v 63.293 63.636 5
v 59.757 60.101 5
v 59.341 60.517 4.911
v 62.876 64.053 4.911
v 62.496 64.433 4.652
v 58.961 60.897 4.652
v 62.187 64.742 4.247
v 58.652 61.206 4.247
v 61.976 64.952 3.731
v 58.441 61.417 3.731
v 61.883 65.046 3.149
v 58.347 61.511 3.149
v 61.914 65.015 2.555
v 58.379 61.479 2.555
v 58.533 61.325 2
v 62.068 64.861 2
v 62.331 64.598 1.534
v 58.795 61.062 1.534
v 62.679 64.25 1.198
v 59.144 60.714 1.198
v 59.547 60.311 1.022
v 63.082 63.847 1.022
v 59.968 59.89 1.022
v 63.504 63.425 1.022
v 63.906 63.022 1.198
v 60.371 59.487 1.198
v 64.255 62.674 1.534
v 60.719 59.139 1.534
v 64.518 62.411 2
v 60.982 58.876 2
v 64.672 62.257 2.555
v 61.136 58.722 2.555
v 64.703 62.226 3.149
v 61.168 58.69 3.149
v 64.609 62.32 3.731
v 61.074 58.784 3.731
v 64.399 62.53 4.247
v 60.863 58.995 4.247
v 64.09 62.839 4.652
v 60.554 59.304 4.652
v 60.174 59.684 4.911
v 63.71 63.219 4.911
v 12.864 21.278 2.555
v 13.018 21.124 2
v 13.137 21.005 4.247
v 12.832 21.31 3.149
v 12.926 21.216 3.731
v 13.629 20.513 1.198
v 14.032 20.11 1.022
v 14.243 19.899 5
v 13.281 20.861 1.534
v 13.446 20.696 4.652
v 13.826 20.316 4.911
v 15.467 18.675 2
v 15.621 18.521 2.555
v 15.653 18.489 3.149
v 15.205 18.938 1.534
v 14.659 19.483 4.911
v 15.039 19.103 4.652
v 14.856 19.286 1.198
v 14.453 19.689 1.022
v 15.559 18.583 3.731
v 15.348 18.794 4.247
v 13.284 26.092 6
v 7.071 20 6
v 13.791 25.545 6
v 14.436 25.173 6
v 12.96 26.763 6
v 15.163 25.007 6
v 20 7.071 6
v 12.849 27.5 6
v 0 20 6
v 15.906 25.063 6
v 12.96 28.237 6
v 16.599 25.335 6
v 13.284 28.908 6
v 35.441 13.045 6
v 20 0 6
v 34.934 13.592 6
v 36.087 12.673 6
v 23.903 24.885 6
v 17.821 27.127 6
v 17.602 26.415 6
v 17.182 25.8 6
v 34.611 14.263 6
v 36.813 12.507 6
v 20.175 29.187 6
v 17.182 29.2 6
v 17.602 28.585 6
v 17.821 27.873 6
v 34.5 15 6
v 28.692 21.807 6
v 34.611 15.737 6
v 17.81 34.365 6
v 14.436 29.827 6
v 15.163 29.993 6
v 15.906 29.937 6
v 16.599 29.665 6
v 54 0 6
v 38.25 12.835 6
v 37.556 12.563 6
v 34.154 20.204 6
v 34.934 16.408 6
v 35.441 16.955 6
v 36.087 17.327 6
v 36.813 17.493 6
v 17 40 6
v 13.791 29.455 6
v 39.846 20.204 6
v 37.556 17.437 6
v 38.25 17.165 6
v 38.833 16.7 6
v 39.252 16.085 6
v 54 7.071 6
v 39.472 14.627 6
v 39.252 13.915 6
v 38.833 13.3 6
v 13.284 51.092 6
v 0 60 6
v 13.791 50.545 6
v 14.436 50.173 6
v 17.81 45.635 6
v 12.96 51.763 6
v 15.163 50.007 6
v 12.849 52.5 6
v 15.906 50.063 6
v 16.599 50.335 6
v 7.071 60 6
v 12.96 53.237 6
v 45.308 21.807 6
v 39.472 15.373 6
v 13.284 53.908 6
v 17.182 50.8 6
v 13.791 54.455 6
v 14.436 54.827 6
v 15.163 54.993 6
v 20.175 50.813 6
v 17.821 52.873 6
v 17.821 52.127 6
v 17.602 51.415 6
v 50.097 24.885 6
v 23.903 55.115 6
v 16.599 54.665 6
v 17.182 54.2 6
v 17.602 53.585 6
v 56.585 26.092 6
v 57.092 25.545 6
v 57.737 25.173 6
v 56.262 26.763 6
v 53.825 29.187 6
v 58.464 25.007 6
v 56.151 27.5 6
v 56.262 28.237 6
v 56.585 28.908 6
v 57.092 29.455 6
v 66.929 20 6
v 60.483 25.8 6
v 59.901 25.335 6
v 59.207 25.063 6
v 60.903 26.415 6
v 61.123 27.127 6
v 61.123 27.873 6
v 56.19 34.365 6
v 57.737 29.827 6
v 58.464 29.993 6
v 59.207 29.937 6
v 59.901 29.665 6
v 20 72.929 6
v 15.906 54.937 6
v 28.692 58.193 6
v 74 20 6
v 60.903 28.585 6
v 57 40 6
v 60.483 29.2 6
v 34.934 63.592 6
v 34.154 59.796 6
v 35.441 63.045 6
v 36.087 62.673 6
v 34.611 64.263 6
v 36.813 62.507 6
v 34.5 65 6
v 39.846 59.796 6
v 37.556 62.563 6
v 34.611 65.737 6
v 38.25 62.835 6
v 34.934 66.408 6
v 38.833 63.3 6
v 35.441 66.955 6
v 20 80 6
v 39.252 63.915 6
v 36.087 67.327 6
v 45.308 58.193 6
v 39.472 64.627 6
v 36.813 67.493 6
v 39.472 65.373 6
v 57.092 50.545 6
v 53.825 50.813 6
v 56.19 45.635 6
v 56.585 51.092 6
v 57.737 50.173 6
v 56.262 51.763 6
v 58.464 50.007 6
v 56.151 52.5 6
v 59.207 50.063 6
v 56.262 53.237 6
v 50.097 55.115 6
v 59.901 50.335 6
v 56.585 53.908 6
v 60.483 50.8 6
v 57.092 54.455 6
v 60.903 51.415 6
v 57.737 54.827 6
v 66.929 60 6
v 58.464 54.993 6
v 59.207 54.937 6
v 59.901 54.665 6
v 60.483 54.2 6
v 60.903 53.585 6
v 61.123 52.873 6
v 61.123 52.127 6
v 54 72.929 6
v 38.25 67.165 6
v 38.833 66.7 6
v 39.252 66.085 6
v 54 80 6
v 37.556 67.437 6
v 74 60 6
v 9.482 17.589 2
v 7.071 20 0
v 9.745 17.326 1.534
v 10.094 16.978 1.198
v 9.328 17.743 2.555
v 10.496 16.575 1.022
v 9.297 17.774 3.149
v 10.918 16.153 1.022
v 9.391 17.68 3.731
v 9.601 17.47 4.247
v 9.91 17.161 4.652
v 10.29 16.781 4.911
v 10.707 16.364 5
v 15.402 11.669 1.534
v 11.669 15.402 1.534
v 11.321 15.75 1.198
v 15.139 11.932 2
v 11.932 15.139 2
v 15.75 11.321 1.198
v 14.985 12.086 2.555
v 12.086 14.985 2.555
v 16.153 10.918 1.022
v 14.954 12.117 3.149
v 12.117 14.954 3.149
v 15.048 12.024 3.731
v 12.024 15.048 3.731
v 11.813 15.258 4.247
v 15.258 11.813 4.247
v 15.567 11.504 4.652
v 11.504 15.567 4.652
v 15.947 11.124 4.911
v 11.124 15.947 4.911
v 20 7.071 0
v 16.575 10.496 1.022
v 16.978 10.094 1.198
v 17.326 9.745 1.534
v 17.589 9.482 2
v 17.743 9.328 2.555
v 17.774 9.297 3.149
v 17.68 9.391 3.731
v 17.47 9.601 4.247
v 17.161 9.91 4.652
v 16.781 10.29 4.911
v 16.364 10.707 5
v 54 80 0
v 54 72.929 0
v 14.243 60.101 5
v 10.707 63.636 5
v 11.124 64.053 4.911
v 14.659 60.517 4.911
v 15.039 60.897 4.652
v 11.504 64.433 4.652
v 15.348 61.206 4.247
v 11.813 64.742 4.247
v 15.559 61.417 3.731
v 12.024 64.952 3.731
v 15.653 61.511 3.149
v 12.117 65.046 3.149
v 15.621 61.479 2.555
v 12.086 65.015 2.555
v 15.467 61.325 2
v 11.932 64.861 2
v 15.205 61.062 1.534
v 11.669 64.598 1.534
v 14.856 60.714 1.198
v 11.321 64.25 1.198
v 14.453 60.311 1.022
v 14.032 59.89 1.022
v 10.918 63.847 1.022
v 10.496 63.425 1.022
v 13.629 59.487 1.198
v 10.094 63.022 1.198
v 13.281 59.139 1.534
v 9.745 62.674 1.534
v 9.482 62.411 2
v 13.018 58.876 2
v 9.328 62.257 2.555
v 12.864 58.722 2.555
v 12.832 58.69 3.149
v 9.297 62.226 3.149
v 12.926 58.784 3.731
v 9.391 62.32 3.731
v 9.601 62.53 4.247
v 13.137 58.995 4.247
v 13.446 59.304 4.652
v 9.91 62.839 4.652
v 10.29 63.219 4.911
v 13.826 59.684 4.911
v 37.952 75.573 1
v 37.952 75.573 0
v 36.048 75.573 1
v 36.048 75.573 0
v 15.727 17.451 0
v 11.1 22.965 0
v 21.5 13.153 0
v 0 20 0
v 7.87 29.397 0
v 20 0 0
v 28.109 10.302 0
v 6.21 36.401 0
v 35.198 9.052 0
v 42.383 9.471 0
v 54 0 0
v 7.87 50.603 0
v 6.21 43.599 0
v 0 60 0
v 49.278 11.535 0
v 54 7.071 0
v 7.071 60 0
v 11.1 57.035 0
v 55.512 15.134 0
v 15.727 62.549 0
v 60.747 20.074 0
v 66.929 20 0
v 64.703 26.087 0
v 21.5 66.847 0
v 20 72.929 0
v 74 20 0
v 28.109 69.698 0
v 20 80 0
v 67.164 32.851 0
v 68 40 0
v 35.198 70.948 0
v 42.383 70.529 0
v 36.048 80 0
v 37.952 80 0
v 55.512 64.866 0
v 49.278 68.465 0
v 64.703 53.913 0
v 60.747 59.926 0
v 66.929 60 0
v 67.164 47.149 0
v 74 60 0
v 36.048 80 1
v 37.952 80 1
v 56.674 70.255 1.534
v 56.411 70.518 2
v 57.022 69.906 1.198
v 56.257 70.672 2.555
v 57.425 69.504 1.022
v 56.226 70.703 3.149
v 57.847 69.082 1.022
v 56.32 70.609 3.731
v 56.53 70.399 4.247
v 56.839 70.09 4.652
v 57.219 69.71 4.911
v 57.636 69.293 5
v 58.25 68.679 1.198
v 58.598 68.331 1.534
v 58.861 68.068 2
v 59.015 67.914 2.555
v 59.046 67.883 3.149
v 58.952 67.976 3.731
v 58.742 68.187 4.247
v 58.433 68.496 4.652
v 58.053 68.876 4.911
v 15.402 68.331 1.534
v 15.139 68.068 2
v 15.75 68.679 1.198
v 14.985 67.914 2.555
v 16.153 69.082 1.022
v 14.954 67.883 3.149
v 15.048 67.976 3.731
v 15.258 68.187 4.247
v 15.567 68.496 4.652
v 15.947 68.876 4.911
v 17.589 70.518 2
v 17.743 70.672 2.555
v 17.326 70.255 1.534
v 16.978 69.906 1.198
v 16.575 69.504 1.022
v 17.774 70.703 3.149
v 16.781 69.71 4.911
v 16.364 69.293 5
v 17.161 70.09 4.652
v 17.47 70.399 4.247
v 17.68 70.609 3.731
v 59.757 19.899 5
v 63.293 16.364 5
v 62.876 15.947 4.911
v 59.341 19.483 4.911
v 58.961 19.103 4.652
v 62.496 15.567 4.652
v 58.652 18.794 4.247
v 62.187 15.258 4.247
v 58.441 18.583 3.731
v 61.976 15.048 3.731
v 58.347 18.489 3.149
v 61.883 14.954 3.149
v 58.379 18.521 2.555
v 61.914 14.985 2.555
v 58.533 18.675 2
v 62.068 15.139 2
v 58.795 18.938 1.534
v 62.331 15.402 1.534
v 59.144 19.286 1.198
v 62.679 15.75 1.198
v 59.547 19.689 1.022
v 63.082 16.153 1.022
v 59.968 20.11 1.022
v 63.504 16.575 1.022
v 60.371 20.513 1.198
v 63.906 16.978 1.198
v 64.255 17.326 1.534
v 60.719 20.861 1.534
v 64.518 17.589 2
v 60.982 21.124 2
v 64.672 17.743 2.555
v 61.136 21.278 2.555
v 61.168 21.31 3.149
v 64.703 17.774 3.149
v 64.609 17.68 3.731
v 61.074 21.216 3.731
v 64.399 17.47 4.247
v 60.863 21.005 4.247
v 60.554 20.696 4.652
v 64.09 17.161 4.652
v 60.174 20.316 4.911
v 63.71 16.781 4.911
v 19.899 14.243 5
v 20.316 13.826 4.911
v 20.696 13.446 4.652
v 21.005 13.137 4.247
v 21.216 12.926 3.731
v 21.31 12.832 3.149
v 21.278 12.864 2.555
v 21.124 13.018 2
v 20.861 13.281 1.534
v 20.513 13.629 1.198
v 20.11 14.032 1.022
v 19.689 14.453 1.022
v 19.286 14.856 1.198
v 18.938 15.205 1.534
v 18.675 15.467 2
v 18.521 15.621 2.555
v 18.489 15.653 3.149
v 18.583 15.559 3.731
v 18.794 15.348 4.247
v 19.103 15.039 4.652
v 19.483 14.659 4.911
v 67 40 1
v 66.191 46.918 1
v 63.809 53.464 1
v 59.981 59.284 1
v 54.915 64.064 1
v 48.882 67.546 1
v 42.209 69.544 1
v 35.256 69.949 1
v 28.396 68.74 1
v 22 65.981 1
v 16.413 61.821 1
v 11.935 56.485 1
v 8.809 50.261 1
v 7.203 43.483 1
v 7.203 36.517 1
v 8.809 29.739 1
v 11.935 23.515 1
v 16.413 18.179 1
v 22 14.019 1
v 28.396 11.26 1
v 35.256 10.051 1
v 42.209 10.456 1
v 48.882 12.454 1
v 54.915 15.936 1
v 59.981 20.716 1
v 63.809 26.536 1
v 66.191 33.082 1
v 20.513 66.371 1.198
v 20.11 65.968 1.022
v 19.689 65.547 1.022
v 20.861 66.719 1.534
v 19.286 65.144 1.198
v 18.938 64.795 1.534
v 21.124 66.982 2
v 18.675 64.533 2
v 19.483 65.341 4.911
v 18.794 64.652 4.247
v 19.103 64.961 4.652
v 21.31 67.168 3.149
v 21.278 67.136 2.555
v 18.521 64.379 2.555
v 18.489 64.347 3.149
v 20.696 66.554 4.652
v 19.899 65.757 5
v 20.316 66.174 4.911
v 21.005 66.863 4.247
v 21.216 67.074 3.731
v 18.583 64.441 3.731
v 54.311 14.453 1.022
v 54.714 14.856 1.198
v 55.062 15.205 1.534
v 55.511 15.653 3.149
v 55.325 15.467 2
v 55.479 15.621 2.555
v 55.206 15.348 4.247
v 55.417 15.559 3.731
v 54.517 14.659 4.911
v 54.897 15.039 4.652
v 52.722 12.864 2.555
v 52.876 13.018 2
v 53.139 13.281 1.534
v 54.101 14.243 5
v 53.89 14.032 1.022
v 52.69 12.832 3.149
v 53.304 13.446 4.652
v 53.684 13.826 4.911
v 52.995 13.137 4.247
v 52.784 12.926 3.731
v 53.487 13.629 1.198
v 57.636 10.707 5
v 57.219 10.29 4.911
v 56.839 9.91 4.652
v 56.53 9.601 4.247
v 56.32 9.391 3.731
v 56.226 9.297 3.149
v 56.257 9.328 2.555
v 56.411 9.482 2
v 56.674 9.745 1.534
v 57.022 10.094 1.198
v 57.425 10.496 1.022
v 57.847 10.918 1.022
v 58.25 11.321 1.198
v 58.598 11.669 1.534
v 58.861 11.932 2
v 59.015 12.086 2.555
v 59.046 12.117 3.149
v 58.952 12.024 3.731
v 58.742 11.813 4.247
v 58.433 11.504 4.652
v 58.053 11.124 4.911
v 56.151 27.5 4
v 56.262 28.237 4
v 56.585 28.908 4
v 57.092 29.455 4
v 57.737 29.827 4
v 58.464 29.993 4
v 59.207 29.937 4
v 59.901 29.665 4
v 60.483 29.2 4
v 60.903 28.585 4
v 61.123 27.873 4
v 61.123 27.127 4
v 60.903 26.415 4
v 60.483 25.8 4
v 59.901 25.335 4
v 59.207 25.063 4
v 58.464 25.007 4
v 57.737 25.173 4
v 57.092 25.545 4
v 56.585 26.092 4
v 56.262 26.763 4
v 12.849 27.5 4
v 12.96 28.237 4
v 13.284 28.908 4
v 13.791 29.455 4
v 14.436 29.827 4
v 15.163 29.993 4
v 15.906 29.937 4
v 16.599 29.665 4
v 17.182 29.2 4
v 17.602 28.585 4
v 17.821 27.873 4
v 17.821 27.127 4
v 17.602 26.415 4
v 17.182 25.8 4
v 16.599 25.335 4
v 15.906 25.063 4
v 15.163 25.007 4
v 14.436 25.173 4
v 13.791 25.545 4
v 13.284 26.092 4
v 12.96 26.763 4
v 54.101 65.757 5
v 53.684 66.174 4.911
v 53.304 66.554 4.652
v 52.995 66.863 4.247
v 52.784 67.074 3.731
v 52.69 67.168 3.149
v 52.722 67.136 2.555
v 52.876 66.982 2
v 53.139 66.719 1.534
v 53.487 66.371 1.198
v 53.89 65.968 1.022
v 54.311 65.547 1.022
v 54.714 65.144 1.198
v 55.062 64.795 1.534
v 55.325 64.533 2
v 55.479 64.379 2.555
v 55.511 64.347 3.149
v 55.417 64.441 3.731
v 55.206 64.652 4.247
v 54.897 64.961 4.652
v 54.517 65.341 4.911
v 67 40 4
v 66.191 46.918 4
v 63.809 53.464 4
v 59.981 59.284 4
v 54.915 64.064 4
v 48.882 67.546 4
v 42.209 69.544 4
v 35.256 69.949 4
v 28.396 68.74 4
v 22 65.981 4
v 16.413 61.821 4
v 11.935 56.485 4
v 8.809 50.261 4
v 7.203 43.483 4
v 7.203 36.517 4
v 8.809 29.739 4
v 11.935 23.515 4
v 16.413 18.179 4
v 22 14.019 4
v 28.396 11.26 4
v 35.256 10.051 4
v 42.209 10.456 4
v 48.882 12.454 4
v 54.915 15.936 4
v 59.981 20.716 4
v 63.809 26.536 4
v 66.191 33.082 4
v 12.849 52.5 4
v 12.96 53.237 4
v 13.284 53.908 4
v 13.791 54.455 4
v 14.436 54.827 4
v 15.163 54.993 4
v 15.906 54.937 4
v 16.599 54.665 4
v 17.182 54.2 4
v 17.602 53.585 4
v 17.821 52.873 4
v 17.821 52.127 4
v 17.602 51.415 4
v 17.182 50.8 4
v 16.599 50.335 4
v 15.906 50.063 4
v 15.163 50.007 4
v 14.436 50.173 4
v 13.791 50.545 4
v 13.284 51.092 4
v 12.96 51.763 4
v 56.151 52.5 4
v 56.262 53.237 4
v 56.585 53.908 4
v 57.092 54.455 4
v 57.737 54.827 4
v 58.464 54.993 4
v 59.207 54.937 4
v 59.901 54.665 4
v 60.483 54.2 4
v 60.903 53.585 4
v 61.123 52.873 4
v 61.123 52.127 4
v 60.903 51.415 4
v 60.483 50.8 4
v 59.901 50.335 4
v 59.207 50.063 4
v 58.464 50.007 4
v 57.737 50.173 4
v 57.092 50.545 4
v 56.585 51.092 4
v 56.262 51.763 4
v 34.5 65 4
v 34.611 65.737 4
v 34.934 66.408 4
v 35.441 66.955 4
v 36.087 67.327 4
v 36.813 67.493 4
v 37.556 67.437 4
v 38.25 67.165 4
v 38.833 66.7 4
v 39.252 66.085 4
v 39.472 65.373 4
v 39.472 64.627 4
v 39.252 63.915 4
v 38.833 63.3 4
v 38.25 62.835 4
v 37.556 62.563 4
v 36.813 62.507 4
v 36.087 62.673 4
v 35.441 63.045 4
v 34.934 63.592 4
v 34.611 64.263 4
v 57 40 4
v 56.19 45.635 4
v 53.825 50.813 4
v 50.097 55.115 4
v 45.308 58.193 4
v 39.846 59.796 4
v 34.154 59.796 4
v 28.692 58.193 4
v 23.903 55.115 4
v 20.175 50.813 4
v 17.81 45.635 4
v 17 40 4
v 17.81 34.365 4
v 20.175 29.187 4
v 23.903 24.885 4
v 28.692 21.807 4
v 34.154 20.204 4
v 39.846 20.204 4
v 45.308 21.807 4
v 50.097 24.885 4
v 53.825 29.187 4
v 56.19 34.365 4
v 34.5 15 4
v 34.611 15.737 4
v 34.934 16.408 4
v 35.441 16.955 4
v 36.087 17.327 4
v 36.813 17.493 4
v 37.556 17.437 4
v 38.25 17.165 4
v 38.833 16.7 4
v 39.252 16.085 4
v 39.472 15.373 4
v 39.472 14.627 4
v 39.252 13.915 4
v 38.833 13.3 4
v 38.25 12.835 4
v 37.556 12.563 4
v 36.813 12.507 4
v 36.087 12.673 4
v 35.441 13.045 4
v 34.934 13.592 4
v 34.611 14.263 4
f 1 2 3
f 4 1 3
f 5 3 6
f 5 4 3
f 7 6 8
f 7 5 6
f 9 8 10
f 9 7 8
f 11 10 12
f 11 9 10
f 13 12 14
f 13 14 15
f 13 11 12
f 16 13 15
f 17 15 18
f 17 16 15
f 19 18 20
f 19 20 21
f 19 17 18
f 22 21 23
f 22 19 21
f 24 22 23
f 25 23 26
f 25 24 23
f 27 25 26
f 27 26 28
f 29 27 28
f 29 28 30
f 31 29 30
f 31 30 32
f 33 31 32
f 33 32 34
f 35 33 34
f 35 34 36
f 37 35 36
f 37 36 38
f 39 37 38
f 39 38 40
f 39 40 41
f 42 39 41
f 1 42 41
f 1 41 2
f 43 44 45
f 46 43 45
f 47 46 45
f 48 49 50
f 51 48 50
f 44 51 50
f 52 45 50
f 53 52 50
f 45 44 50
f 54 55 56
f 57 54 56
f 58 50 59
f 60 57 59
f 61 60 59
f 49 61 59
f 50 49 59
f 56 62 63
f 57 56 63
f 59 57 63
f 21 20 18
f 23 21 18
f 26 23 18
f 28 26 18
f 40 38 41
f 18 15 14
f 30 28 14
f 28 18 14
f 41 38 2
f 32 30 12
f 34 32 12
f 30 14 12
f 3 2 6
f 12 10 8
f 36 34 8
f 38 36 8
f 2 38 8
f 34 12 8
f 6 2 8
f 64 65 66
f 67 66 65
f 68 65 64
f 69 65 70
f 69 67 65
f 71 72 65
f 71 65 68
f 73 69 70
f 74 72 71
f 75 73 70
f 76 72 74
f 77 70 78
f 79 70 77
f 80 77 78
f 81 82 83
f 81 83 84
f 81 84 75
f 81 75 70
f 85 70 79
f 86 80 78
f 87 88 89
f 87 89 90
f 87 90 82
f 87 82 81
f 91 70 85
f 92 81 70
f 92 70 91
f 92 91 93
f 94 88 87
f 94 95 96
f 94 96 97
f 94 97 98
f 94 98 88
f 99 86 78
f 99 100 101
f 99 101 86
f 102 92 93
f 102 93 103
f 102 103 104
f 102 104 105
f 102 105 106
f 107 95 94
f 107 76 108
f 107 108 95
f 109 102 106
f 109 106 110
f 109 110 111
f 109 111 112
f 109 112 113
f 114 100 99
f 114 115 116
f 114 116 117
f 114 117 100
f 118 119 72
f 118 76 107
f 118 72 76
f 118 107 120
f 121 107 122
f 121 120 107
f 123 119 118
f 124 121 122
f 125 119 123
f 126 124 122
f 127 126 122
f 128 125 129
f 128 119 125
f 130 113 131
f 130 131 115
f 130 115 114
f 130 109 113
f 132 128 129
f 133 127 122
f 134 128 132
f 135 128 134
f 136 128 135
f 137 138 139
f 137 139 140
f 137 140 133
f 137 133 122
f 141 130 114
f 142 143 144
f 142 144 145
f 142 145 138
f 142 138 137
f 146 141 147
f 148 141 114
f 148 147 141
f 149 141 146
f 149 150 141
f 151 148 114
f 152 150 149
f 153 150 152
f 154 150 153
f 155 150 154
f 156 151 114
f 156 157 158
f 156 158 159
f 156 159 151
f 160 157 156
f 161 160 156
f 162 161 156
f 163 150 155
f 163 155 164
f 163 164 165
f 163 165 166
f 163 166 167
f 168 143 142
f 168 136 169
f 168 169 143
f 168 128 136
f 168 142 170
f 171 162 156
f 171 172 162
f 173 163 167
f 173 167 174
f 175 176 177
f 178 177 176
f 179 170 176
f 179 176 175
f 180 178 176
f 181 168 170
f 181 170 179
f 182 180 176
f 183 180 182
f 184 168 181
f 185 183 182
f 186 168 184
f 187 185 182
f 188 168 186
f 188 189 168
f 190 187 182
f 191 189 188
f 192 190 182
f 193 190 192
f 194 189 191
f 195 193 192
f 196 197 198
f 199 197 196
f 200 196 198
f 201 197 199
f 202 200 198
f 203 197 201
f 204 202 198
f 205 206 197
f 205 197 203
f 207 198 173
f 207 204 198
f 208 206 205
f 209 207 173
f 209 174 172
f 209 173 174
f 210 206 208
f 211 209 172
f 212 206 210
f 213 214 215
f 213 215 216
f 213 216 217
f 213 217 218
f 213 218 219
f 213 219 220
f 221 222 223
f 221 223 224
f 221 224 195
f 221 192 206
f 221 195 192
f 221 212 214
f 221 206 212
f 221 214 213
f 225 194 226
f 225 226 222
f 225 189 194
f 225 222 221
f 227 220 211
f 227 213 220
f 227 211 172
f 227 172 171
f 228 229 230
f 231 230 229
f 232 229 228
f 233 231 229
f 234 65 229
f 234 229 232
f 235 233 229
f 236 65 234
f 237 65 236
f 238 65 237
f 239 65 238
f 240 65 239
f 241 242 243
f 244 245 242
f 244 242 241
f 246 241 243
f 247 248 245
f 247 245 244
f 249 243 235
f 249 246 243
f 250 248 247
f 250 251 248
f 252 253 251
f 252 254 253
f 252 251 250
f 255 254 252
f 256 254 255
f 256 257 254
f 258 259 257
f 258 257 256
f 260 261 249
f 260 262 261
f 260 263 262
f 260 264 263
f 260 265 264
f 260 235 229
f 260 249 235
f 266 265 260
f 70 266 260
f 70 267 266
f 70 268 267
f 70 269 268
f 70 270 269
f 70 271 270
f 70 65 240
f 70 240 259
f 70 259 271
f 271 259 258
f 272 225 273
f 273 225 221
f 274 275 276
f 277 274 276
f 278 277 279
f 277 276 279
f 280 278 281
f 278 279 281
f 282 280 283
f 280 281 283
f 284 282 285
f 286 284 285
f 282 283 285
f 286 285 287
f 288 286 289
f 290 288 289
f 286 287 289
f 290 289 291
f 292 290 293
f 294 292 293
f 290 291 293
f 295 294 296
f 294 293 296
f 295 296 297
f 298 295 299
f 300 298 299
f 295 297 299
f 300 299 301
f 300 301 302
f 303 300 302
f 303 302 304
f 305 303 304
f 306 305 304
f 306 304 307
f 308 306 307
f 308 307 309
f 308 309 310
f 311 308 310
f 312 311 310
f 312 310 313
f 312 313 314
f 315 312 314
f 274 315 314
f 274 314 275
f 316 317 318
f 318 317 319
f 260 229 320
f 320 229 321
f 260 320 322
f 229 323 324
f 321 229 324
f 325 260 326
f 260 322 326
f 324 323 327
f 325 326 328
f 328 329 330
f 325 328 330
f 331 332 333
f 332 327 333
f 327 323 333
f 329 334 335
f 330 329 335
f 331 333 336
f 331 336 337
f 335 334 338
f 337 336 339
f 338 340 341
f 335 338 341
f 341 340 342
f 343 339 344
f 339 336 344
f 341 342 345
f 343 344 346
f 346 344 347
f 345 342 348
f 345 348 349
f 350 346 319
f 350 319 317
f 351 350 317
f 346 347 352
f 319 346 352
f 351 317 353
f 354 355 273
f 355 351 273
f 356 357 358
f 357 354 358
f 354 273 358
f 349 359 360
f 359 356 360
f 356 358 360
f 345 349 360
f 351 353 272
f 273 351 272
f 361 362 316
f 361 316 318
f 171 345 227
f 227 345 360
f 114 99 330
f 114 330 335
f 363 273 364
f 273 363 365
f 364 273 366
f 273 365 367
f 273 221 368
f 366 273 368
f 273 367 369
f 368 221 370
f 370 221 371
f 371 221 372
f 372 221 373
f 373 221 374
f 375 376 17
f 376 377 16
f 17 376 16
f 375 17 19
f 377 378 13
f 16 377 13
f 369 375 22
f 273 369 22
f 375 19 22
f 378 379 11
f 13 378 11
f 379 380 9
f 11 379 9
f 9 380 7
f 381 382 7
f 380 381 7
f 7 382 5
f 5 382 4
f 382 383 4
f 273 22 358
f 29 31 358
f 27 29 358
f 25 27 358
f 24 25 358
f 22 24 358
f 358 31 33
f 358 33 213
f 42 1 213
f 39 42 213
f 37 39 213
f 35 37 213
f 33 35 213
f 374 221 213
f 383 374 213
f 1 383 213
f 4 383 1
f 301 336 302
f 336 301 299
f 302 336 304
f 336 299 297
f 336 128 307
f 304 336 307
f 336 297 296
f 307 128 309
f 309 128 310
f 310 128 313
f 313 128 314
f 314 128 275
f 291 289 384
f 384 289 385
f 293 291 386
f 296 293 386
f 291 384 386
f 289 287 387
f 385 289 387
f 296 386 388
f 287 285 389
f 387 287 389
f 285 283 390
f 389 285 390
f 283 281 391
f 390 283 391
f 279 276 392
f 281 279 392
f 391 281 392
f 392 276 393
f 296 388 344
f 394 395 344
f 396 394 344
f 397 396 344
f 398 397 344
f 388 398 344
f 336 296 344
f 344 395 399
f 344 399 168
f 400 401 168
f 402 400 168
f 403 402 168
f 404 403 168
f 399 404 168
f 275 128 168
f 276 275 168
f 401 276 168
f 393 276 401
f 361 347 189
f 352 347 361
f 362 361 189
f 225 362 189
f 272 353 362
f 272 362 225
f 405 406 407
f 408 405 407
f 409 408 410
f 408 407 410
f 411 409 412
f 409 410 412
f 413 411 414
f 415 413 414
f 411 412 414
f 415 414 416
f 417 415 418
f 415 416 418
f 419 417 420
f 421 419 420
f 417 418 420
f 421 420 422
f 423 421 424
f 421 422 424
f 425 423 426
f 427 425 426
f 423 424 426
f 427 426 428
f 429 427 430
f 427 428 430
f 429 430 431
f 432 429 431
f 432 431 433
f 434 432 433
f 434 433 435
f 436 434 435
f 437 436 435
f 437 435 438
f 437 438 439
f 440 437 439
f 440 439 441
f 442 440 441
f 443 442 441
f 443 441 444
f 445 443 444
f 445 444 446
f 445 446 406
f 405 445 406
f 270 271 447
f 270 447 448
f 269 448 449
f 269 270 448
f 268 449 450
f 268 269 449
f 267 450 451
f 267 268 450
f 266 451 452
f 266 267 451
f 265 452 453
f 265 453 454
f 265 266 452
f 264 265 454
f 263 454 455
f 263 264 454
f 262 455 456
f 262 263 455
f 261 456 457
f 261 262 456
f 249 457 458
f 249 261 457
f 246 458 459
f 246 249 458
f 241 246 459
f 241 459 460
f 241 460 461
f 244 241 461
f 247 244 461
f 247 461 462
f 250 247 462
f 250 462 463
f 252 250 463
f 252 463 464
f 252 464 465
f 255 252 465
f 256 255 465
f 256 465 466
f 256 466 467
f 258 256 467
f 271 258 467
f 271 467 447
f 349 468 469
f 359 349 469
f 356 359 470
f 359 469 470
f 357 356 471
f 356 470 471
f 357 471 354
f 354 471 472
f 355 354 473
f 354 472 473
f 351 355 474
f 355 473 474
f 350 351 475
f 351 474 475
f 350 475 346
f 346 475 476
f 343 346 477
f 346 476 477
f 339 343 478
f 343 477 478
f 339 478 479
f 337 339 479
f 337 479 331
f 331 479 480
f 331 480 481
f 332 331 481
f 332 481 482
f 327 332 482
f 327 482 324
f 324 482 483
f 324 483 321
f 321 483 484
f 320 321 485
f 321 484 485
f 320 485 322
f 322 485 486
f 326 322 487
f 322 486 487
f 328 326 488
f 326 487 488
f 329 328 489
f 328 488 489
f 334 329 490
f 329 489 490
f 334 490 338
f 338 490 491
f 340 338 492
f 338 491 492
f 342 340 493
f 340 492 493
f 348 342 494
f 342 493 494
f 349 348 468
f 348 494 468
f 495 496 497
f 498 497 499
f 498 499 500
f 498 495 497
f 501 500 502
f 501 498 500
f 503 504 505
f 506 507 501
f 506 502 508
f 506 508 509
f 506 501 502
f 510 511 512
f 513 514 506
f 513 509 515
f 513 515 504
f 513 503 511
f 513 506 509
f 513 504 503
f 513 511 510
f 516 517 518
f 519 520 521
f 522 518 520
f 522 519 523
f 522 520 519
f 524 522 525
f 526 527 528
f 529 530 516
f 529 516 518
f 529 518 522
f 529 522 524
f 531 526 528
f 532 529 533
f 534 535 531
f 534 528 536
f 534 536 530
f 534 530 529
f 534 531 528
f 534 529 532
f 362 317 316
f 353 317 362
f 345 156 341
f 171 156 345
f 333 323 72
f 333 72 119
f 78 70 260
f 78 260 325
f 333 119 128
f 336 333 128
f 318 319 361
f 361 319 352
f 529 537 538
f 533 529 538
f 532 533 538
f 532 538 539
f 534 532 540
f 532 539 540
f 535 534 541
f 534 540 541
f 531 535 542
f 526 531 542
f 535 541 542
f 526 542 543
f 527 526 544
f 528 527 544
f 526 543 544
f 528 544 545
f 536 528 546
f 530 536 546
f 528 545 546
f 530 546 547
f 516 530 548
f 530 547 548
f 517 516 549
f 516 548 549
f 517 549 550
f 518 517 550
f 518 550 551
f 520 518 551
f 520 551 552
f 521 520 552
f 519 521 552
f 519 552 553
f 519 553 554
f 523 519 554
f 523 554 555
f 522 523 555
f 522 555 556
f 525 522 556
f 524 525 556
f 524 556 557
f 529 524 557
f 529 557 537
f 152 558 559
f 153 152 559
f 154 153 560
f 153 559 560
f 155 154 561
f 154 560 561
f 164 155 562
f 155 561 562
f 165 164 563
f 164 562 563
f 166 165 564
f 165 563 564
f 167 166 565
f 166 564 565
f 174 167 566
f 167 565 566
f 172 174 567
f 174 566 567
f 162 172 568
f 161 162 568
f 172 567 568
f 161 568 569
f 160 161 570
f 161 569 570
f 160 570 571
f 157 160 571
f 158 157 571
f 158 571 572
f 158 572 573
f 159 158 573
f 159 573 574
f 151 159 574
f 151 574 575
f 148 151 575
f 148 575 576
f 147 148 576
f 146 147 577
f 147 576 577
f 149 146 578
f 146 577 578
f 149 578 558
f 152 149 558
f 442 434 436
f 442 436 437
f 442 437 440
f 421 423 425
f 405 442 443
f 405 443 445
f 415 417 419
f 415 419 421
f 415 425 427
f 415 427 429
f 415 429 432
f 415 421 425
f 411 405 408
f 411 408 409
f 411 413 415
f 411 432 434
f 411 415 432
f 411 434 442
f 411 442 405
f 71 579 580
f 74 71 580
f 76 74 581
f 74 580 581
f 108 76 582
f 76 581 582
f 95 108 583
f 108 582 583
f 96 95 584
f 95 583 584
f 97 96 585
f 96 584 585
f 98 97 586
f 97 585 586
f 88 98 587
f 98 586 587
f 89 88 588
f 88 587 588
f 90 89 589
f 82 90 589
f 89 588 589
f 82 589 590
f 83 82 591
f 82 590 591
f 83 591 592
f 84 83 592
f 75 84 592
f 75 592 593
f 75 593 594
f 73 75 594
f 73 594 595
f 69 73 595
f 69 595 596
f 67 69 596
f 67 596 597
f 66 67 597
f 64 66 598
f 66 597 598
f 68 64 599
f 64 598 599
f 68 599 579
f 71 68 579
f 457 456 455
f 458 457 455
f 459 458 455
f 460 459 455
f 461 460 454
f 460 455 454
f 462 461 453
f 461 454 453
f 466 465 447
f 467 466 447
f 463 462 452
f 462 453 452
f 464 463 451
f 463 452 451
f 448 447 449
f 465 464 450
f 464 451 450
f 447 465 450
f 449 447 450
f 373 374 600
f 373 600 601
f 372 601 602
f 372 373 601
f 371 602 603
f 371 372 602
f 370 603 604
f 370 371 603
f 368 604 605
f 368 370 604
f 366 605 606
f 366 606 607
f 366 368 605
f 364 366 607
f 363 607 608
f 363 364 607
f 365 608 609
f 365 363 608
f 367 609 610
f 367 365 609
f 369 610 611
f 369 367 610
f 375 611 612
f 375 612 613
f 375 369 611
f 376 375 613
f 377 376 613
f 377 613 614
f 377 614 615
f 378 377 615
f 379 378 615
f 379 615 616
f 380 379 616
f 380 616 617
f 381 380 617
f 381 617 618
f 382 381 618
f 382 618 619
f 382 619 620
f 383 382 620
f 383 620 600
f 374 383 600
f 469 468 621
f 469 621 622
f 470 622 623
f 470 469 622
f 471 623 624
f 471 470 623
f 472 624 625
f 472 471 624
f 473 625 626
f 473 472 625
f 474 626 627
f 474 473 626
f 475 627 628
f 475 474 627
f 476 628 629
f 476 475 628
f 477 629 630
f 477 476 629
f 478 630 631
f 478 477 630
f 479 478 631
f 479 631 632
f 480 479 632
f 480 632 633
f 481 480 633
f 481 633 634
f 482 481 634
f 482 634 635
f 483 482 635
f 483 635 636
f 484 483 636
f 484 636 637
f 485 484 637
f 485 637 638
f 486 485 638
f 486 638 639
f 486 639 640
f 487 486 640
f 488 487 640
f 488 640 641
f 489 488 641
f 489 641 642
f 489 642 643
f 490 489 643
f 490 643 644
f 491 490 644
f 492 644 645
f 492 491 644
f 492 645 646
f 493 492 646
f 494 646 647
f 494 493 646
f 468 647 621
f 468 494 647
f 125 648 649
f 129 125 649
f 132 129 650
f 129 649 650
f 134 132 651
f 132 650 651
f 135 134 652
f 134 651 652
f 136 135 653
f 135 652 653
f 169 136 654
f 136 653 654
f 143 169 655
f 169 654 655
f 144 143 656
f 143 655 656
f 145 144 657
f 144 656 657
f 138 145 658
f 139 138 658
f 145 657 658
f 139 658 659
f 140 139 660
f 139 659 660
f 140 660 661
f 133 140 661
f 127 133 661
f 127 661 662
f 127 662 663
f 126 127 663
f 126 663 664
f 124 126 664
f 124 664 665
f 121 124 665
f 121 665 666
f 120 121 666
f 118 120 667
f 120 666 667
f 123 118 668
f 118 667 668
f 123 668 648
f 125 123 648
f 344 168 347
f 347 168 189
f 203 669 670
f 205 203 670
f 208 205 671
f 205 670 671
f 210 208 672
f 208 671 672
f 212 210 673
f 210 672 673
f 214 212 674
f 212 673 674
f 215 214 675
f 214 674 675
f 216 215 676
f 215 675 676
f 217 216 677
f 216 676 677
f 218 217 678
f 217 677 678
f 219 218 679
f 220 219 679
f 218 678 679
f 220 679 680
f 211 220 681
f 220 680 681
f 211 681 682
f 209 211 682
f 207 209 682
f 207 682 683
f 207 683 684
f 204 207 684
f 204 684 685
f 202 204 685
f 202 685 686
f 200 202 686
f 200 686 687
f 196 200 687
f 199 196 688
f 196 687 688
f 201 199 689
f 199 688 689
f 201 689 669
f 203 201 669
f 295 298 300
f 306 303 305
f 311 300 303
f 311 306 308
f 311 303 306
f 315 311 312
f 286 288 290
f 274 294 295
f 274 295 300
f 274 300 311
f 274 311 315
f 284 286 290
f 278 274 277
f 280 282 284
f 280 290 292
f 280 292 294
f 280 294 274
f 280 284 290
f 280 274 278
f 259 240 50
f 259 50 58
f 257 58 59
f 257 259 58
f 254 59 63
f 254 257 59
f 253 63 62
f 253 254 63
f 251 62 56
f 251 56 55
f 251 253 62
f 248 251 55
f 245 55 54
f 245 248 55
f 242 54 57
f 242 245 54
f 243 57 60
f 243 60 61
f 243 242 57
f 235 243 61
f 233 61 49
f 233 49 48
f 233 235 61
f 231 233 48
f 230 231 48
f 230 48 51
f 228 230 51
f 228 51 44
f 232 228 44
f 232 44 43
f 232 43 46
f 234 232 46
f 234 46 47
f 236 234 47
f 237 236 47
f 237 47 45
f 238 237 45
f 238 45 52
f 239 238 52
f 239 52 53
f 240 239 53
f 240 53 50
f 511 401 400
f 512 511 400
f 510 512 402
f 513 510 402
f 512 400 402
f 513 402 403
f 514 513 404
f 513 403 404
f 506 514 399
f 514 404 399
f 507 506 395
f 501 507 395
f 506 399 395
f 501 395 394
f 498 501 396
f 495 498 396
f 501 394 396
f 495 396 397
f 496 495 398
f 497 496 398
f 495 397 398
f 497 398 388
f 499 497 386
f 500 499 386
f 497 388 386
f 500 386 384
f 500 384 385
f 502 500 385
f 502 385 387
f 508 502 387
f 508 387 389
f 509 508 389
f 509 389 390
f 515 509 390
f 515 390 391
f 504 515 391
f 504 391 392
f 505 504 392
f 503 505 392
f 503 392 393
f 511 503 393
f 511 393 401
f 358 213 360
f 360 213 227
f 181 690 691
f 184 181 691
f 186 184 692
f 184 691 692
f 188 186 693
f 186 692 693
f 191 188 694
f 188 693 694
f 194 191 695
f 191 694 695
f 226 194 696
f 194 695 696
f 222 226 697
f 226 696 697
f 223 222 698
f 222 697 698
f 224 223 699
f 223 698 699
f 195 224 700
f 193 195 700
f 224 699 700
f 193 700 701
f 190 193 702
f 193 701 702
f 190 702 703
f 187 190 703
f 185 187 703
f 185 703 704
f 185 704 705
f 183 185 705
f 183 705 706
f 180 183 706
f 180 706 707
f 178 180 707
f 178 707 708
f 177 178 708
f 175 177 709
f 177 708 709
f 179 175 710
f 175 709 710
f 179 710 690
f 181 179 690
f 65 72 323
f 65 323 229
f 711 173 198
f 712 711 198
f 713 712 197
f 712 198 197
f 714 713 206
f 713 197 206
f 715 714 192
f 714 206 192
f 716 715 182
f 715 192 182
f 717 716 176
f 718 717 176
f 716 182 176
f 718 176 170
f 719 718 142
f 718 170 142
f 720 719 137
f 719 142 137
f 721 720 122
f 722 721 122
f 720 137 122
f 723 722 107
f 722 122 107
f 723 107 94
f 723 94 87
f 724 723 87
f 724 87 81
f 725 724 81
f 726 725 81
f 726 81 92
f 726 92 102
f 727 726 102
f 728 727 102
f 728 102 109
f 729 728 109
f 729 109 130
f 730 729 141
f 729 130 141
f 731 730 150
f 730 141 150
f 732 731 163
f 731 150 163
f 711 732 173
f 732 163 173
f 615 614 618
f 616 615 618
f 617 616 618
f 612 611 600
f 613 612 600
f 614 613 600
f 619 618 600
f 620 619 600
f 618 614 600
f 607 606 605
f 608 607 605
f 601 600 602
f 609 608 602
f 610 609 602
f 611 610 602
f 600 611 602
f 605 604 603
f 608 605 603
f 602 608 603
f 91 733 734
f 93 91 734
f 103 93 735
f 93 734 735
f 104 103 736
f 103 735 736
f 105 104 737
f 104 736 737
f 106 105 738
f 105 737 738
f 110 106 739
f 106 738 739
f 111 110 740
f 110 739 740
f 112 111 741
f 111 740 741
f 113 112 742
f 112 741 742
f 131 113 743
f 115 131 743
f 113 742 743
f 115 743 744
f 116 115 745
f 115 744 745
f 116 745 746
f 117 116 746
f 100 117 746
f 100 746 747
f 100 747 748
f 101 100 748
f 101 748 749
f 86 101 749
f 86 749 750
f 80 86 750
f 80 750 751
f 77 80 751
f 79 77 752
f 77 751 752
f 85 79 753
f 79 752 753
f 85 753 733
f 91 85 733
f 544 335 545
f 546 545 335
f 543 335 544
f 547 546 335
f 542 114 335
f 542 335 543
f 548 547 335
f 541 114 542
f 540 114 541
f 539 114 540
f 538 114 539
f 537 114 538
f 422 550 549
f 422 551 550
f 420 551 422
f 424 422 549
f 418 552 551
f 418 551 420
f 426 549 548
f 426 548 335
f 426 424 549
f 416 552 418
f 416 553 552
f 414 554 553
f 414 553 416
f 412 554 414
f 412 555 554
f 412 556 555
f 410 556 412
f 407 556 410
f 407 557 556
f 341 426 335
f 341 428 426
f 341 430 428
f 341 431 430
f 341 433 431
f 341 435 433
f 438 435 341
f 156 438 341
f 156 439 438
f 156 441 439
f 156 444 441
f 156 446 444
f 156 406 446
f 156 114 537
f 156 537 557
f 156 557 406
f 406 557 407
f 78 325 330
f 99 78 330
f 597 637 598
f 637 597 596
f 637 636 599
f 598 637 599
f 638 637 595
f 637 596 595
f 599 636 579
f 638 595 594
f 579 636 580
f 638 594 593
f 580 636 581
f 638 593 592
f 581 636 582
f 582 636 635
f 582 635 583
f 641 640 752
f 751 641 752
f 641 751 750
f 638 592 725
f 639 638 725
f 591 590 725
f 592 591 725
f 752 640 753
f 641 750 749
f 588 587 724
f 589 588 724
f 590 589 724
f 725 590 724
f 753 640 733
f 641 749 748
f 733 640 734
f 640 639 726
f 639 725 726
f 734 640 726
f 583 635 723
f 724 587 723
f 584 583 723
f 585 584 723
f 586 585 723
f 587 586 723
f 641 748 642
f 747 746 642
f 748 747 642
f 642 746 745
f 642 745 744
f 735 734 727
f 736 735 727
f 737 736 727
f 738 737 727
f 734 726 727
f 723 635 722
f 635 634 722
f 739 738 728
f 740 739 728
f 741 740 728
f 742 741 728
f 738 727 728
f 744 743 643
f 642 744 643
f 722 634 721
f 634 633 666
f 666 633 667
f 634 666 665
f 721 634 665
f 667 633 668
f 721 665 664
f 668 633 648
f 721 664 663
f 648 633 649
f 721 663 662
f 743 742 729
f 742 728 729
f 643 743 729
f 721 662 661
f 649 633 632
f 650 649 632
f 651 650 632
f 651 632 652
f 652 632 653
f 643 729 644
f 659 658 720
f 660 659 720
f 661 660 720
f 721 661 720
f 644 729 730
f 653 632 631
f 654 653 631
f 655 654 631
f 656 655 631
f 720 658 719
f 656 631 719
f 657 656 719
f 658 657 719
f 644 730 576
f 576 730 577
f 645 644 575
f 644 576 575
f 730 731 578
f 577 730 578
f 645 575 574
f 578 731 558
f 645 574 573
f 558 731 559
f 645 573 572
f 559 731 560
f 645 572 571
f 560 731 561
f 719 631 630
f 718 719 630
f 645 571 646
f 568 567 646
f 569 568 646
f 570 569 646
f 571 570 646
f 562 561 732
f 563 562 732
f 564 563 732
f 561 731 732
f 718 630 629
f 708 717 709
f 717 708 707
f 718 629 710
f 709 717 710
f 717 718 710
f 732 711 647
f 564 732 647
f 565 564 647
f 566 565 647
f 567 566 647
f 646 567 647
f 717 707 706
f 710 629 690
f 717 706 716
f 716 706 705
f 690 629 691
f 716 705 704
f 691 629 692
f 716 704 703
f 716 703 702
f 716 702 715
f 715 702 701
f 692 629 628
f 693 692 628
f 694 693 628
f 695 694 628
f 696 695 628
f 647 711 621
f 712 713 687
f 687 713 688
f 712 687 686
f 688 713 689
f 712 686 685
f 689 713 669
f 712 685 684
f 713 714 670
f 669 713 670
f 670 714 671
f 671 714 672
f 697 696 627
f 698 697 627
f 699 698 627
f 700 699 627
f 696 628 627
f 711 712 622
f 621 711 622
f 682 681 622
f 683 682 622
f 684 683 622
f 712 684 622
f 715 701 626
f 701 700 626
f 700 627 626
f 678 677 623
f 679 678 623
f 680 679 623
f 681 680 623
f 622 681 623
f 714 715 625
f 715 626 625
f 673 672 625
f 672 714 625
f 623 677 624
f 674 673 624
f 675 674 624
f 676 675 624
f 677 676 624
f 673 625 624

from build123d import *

# Parameters (mm, degrees)
SKETCH1_W               = 74
SKETCH1_H               = 80
SKETCH1_R               = 30
BOSS_EXTRUDE1_DEPTH     = 6
SKETCH2_R               = 30
SKETCH2_R_2             = 20
BOSS_EXTRUDE2_DEPTH     = 2
SKETCH3_R               = 2.5
CUT_EXTRUDE1_DEPTH      = 2
CHAMFER1_SIZE           = 20
SKETCH4_R               = 2
CUT_EXTRUDE2_DEPTH      = 10
MIRROR2_COPY_1_SKETCH_R = 2
MIRROR2_COPY_1_DEPTH    = 10
CHAMFER2_SIZE           = 1
SKETCH7_W               = 1.90476799
SKETCH7_H               = 4.426812408
CUT_EXTRUDE3_DEPTH      = 1
CUT_EXTRUDE4_DEPTH      = 7


with BuildPart() as part:
    # Sketch1 → Boss-Extrude1 (new body)
    with BuildSketch(Plane.XY):
        with Locations((37, 40)):
            Rectangle(SKETCH1_W, SKETCH1_H)
        with Locations((37, 40)):
            Circle(SKETCH1_R, mode=Mode.SUBTRACT)
    extrude(amount=BOSS_EXTRUDE1_DEPTH)

    # Sketch2 → Boss-Extrude2 (add)
    with BuildSketch(Plane.XY.offset(6)):
        with Locations((37, 40)):
            Circle(SKETCH2_R)
        with Locations((37, 40)):
            Circle(SKETCH2_R_2, mode=Mode.SUBTRACT)
    extrude(amount=-BOSS_EXTRUDE2_DEPTH)

    # Sketch3 → Cut-Extrude1 (cut)
    with BuildSketch(Plane(origin=(0, 0, 4), x_dir=(-1, 0, 0), z_dir=(0, 0, -1))):
        with Locations((-37, 65)):
            Circle(SKETCH3_R)
        with Locations((-15.349364905, 52.5)):
            Circle(SKETCH3_R)
        with Locations((-15.349364905, 27.5)):
            Circle(SKETCH3_R)
        with Locations((-37, 15)):
            Circle(SKETCH3_R)
        with Locations((-58.650635095, 27.5)):
            Circle(SKETCH3_R)
        with Locations((-58.650635095, 52.5)):
            Circle(SKETCH3_R)
    extrude(amount=-CUT_EXTRUDE1_DEPTH, mode=Mode.SUBTRACT)

    # Chamfer1
    chamfer1_edges = [part.edges().sort_by_distance(p)[0] for p in [
        (0, 80, 3),
        (74, 80, 3),
        (74, 0, 3),
        (0, 0, 3),
    ]]
    chamfer(chamfer1_edges, length=CHAMFER1_SIZE)

    # Sketch4 → Cut-Extrude2 (cut)
    with BuildSketch(Plane(origin=(-30, 30, 0), x_dir=(0, 0, 1), z_dir=(-0.707106781, 0.707106781, 0))):
        with Locations((3, 60.568542495)):
            Circle(SKETCH4_R)
        with Locations((3, 52.568542495)):
            Circle(SKETCH4_R)
    cut_extrude2 = extrude(amount=-CUT_EXTRUDE2_DEPTH, mode=Mode.SUBTRACT)

    # Mirror1: Cut-Extrude2 across plane
    add(cut_extrude2.mirror(Plane.ZY.offset(-37)), mode=Mode.SUBTRACT)

    # Mirror2: Cut-Extrude2 across plane
    add(cut_extrude2.mirror(Plane(origin=(0, 40, 0), x_dir=(0, 0, 1), z_dir=(0, -1, 0))), mode=Mode.SUBTRACT)

    # Mirror2 copy 1 sketch → Mirror2 copy 1 (cut)
    with BuildSketch(Plane(origin=(104, 50, 0), x_dir=(0, 0, 1), z_dir=(0.707106781, -0.707106781, 0))):
        with Locations((3, 60.568542495)):
            Circle(MIRROR2_COPY_1_SKETCH_R)
        with Locations((3, 52.568542495)):
            Circle(MIRROR2_COPY_1_SKETCH_R)
    extrude(amount=-MIRROR2_COPY_1_DEPTH, mode=Mode.SUBTRACT)

    # Chamfer2
    chamfer2_edges = [part.edges().sort_by_distance(p)[0] for p in [
        (7, 40, 0),
    ]]
    chamfer(chamfer2_edges, length=CHAMFER2_SIZE)

    # Sketch7 → Cut-Extrude3 (cut)
    with BuildSketch(Plane(origin=(0, 0, 0), x_dir=(-1, 0, 0), z_dir=(0, 0, -1))):
        with Locations((-37, 77.786593796)):
            Rectangle(SKETCH7_W, SKETCH7_H)
    extrude(amount=-CUT_EXTRUDE3_DEPTH, mode=Mode.SUBTRACT)

    # Sketch8 → Cut-Extrude4 (cut, through all)
    with BuildSketch(Plane.XY.offset(6)):
        Polygon((0, 60), (7.071067812, 60), (20, 72.928932188), (20, 80), align=None)
        Polygon((54, 80), (54, 72.928932188), (66.928932188, 60), (74, 60), align=None)
        Polygon((66.928932188, 20), (74, 20), (54, 0), (54, 7.071067812), align=None)
        Polygon((0, 20), (7.071067812, 20), (20, 7.071067812), (20, 0), align=None)
    extrude(amount=-CUT_EXTRUDE4_DEPTH, mode=Mode.SUBTRACT)


solid = part.part
